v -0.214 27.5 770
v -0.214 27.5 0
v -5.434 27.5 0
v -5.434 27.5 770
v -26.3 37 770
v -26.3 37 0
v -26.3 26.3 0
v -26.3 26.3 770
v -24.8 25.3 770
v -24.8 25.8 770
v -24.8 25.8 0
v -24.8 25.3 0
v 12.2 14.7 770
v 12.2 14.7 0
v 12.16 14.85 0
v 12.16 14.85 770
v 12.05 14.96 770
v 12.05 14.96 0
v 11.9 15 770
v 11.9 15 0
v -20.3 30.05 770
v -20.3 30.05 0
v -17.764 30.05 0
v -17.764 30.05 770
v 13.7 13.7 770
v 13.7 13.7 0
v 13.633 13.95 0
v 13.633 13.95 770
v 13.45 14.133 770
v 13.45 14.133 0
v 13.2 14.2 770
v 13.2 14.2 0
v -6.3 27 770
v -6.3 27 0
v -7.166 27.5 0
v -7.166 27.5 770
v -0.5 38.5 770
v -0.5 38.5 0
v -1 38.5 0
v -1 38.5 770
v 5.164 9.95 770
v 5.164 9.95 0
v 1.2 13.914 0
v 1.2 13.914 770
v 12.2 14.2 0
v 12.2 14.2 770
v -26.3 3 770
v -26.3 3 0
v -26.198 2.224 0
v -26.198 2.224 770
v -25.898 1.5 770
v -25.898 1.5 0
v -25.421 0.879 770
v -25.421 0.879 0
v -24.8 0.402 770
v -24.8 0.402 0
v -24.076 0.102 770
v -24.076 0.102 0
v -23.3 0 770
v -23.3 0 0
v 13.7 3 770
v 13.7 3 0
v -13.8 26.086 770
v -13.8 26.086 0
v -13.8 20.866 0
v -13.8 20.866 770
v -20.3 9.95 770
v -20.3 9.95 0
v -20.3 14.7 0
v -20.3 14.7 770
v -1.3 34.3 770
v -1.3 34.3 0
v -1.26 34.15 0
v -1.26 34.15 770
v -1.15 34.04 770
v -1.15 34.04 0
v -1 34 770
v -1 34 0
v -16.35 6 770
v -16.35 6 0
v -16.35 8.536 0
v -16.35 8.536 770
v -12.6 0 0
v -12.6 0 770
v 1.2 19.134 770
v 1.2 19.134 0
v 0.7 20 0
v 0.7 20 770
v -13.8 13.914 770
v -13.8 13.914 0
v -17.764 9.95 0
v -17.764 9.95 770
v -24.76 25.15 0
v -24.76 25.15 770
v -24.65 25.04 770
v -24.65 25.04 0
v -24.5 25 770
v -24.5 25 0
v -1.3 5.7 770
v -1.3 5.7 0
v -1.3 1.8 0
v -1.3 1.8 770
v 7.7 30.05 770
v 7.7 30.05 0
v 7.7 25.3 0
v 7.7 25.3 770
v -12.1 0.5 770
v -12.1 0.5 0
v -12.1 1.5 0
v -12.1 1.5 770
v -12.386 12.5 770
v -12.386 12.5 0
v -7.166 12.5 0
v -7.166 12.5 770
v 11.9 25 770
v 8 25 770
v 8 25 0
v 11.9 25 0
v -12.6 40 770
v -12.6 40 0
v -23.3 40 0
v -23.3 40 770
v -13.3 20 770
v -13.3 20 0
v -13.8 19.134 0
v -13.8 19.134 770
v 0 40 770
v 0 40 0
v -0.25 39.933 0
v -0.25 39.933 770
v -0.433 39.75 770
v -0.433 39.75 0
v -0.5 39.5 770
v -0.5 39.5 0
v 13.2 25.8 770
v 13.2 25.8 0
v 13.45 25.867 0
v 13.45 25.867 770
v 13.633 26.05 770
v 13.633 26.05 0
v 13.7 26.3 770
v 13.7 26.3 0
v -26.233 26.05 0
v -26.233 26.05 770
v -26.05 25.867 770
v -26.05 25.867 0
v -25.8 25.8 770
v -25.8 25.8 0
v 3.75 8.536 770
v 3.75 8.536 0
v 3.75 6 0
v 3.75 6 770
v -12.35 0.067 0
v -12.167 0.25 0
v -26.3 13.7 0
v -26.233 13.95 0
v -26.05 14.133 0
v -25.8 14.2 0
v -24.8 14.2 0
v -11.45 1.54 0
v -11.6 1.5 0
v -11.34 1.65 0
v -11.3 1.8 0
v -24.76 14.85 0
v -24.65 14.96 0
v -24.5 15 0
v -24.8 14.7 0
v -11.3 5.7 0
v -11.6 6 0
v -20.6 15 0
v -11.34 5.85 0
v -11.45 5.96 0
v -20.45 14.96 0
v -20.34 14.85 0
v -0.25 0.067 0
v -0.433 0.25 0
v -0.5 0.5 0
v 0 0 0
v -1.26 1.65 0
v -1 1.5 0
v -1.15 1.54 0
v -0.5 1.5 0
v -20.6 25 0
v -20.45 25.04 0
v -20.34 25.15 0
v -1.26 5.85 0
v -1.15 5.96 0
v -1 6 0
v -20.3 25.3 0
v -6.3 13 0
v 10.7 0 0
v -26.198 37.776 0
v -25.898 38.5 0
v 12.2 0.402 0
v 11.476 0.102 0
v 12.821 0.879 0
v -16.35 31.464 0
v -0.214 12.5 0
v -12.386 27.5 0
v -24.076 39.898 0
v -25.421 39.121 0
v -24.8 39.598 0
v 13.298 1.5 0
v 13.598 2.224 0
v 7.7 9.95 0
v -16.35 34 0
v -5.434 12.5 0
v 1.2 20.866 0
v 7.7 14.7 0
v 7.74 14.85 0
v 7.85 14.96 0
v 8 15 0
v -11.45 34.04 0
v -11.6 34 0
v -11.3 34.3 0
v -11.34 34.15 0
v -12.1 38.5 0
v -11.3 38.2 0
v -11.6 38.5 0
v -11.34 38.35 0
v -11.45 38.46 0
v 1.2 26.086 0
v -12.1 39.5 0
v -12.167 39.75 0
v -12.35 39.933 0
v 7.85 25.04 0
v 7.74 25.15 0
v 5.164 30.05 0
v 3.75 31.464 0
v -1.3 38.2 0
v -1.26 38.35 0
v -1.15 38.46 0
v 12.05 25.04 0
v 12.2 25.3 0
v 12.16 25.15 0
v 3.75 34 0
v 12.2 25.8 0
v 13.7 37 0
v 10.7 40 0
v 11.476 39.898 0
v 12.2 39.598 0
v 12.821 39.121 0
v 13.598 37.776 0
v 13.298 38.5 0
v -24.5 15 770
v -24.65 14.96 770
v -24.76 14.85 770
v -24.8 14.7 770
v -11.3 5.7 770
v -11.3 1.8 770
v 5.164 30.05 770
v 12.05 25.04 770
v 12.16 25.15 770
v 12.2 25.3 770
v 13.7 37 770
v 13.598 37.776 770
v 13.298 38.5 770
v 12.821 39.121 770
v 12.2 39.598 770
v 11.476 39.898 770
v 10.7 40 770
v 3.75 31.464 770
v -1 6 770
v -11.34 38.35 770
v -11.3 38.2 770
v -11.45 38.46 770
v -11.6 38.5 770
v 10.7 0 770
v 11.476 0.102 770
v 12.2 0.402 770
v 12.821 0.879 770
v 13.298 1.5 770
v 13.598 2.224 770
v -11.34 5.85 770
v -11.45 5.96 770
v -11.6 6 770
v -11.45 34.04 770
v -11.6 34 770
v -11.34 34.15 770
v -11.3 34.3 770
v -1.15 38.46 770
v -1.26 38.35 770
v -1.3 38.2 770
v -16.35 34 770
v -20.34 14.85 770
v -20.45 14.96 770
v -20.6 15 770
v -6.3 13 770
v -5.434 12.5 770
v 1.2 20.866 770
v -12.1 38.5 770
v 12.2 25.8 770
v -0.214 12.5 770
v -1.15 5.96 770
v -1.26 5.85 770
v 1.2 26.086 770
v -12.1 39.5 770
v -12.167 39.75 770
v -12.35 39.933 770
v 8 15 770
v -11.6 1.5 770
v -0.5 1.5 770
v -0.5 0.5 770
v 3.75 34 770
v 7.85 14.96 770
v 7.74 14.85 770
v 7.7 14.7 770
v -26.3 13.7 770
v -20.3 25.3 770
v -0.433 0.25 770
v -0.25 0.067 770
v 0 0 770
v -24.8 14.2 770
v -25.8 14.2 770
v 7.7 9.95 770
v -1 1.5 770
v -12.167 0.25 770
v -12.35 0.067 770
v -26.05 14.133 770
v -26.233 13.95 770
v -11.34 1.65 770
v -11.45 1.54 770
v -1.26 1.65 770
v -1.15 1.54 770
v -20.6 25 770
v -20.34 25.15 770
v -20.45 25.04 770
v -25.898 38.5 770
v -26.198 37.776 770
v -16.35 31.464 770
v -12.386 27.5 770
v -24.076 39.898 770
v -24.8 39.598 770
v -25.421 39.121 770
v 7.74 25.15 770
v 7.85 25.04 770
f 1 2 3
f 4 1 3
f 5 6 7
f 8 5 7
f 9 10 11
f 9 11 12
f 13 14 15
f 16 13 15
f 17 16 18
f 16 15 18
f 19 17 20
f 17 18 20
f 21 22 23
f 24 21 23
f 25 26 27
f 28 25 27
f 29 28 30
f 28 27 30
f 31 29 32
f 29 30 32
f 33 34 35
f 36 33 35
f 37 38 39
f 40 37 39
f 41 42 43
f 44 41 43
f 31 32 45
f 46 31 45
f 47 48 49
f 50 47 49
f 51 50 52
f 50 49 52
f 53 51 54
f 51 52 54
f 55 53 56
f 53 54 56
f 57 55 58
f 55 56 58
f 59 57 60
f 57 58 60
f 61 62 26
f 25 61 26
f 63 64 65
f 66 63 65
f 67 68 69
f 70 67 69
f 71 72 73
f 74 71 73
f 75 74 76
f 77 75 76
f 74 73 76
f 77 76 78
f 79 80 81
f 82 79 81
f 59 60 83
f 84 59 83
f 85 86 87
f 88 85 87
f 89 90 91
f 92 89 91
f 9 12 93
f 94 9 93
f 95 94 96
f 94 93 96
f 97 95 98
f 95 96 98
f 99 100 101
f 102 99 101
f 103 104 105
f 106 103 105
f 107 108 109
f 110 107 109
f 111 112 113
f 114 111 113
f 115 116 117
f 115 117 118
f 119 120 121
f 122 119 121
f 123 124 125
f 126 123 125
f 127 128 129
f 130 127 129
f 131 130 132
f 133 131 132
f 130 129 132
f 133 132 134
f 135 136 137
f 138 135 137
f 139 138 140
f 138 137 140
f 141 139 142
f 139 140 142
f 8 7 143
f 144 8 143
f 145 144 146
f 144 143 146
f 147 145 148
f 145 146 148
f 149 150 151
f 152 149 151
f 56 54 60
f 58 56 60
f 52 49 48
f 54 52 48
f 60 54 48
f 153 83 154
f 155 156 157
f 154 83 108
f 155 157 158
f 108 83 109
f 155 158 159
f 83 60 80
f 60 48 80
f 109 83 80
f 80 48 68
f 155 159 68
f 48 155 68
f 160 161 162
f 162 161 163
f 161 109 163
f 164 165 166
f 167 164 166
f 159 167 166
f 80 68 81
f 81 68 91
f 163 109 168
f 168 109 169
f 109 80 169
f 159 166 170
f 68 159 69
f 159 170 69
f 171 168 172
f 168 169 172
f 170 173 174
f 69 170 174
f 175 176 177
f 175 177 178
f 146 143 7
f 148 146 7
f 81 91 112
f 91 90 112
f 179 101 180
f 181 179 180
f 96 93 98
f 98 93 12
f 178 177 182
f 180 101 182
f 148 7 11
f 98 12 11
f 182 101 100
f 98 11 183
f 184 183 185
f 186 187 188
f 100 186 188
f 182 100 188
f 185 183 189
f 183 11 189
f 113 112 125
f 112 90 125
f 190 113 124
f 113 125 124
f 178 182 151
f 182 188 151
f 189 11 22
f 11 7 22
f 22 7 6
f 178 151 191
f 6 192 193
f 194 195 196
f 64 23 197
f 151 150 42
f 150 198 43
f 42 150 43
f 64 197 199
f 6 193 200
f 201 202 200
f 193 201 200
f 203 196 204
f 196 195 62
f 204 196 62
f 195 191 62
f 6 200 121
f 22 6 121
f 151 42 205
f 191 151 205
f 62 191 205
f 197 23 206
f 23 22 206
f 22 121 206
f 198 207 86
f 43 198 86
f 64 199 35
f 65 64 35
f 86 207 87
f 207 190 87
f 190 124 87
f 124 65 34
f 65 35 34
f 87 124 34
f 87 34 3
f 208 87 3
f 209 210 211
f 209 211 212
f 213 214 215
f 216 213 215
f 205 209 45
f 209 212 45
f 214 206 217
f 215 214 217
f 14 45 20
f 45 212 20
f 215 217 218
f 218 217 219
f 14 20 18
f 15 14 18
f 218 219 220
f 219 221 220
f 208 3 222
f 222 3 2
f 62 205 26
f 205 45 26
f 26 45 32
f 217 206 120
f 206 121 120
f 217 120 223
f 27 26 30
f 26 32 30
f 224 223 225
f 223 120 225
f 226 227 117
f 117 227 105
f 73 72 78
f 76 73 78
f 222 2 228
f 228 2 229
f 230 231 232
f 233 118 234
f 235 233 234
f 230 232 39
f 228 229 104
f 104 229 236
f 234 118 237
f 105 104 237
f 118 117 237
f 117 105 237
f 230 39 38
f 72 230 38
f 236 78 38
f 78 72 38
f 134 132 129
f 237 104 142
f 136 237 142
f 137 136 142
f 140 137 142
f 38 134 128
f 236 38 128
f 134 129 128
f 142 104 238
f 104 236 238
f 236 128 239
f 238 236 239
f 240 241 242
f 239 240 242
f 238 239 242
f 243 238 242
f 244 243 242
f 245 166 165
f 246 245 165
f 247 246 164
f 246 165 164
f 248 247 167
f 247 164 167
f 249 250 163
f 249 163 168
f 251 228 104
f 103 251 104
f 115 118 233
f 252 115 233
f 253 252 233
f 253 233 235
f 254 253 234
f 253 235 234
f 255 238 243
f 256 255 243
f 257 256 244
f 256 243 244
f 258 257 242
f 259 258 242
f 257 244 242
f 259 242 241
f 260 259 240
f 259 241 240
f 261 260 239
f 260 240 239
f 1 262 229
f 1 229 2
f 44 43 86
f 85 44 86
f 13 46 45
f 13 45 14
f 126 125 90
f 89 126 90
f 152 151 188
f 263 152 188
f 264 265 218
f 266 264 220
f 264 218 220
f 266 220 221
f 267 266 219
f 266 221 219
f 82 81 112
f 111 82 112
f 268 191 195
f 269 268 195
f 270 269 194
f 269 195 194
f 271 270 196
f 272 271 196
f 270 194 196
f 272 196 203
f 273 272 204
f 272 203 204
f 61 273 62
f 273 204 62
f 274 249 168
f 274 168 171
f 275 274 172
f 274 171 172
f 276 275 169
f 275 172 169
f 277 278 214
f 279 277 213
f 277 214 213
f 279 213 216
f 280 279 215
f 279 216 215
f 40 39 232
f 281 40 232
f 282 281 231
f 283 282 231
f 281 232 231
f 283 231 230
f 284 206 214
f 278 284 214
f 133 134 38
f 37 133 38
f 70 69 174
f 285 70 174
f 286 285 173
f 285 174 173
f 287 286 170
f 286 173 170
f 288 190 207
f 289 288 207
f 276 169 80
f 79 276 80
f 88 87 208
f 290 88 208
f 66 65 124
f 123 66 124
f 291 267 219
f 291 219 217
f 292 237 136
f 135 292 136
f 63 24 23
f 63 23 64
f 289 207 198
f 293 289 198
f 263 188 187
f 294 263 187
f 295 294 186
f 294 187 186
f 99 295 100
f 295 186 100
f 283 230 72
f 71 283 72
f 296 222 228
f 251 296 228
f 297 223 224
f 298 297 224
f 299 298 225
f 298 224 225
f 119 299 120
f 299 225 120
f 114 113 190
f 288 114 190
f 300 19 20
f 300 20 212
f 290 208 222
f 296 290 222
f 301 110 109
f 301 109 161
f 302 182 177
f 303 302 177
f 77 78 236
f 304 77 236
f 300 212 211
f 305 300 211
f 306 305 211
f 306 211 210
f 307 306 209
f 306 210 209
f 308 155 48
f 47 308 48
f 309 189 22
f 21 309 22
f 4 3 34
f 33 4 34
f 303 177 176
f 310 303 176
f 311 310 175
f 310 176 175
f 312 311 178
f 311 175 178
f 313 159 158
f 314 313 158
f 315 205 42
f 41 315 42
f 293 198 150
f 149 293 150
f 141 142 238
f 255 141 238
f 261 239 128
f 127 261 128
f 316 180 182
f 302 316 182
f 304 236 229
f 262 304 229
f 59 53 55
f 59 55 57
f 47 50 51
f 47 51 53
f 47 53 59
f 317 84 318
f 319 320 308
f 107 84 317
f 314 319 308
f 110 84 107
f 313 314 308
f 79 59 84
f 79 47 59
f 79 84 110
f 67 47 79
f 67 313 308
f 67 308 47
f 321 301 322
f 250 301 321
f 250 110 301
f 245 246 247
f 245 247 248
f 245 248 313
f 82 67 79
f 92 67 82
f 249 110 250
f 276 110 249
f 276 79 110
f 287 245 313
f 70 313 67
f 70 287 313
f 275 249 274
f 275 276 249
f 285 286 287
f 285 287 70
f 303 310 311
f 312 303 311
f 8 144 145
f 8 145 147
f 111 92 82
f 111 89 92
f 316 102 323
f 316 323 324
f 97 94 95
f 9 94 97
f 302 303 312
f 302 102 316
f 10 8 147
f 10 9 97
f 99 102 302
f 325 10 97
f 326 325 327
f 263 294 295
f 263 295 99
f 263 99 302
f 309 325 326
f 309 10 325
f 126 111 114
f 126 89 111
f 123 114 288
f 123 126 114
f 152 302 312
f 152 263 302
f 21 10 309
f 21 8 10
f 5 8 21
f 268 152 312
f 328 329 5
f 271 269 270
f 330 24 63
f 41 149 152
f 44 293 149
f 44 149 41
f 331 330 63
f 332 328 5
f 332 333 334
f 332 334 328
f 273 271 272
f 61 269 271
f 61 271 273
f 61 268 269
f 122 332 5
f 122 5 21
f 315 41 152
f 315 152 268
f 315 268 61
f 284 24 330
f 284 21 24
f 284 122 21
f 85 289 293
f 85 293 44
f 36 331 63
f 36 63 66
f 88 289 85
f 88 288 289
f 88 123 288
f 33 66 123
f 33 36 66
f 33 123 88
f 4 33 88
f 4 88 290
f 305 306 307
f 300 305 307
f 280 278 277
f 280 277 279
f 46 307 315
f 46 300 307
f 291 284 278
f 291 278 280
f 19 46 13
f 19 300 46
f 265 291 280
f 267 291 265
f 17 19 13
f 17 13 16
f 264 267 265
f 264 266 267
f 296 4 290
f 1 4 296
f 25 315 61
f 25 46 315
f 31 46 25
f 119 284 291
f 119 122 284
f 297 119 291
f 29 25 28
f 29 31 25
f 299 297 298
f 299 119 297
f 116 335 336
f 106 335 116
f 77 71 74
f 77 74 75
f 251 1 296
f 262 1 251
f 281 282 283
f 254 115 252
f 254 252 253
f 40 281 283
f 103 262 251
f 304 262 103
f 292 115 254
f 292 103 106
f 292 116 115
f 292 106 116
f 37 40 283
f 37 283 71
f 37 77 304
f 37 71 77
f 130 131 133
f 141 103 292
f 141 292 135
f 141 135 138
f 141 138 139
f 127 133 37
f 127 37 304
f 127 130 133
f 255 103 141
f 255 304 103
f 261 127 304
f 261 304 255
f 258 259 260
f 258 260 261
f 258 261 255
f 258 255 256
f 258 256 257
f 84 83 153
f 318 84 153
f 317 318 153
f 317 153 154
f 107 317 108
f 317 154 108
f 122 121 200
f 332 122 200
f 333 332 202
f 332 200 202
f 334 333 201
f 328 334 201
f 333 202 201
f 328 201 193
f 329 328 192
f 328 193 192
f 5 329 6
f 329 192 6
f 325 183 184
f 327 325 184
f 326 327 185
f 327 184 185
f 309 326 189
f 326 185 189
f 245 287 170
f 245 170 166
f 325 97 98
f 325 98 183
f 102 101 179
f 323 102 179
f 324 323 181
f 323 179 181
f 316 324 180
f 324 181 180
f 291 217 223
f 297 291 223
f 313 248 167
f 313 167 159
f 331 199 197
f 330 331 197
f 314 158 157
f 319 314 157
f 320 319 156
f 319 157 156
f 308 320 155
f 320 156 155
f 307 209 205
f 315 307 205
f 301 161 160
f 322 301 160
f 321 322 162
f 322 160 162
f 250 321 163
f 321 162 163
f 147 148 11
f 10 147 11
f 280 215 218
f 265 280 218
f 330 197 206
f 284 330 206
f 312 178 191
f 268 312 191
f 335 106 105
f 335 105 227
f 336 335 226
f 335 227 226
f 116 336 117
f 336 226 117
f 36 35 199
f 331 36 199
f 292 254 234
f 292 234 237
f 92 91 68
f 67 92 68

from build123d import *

# Parameters (mm, degrees)
BOSS_EXTRUDE1_DEPTH = 770


with BuildPart() as part:
    # Sketch2 → Boss-Extrude1 (new body)
    with BuildSketch(Plane.XY):
        with BuildLine():
            Line((-20.29996667, 9.949913991), (-20.29996667, 14.70003333))
            ThreePointArc((-20.29996667, 14.70003333), (-20.387834636, 14.912165364), (-20.59996667, 15.00003333))
            Line((-20.59996667, 15.00003333), (-24.49996667, 15.00003333))
            ThreePointArc((-24.49996667, 15.00003333), (-24.712098704, 14.912165364), (-24.79996667, 14.70003333))
            Line((-24.79996667, 14.70003333), (-24.79996667, 14.20003333))
            Line((-24.79996667, 14.20003333), (-25.79996667, 14.20003333))
            ThreePointArc((-25.79996667, 14.20003333), (-26.153520061, 14.053586721), (-26.29996667, 13.70003333))
            Line((-26.29996667, 13.70003333), (-26.29996667, 3))
            ThreePointArc((-26.29996667, 3), (-25.421287014, 0.878679656), (-23.29996667, 0))
            Line((-23.29996667, 0), (-12.6, 0))
            ThreePointArc((-12.6, 0), (-12.246446609, 0.146446609), (-12.1, 0.5))
            Line((-12.1, 0.5), (-12.1, 1.5))
            Line((-12.1, 1.5), (-11.6, 1.5))
            ThreePointArc((-11.6, 1.5), (-11.387867966, 1.587867966), (-11.3, 1.8))
            Line((-11.3, 1.8), (-11.3, 5.7))
            ThreePointArc((-11.3, 5.7), (-11.387867966, 5.912132034), (-11.6, 6))
            Line((-11.6, 6), (-16.350119339, 6))
            Line((-16.350119339, 6), (-16.350119339, 8.535633769))
            Line((-16.350119339, 8.535633769), (-12.385643087, 12.500110021))
            Line((-12.385643087, 12.500110021), (-7.165992074, 12.500110021))
            Line((-7.165992074, 12.500110021), (-6.29996667, 13.000110021))
            Line((-6.29996667, 13.000110021), (-5.433941266, 12.500110021))
            Line((-5.433941266, 12.500110021), (-0.214290253, 12.500110021))
            Line((-0.214290253, 12.500110021), (3.750119339, 8.535700429))
            Line((3.750119339, 8.535700429), (3.750119339, 6))
            Line((3.750119339, 6), (-1, 6))
            ThreePointArc((-1, 6), (-1.212132034, 5.912132034), (-1.3, 5.7))
            Line((-1.3, 5.7), (-1.3, 1.8))
            ThreePointArc((-1.3, 1.8), (-1.212132034, 1.587867966), (-1, 1.5))
            Line((-1, 1.5), (-0.5, 1.5))
            Line((-0.5, 1.5), (-0.5, 0.5))
            ThreePointArc((-0.5, 0.5), (-0.353553391, 0.146446609), (0, 0))
            Line((0, 0), (10.70003333, 0))
            ThreePointArc((10.70003333, 0), (12.821353674, 0.878679656), (13.70003333, 3))
            Line((13.70003333, 3), (13.70003333, 13.69996667))
            ThreePointArc((13.70003333, 13.69996667), (13.553586721, 14.053520061), (13.20003333, 14.19996667))
            Line((13.20003333, 14.19996667), (12.20003333, 14.19996667))
            Line((12.20003333, 14.19996667), (12.20003333, 14.69996667))
            ThreePointArc((12.20003333, 14.69996667), (12.112165364, 14.912098704), (11.90003333, 14.99996667))
            Line((11.90003333, 14.99996667), (8.00003333, 14.99996667))
            ThreePointArc((8.00003333, 14.99996667), (7.787901296, 14.912098704), (7.70003333, 14.69996667))
            Line((7.70003333, 14.69996667), (7.70003333, 9.949847331))
            Line((7.70003333, 9.949847331), (5.164399561, 9.949847331))
            Line((5.164399561, 9.949847331), (1.199923309, 13.914323583))
            Line((1.199923309, 13.914323583), (1.199923309, 19.133974596))
            Line((1.199923309, 19.133974596), (0.699923309, 20))
            Line((0.699923309, 20), (1.199923309, 20.866025404))
            Line((1.199923309, 20.866025404), (1.199923309, 26.085676417))
            Line((1.199923309, 26.085676417), (5.164332901, 30.050086009))
            Line((5.164332901, 30.050086009), (7.70003333, 30.050086009))
            Line((7.70003333, 30.050086009), (7.70003333, 25.29996667))
            ThreePointArc((7.70003333, 25.29996667), (7.787901296, 25.087834636), (8.00003333, 24.99996667))
            Line((8.00003333, 24.99996667), (11.90003333, 24.99996667))
            ThreePointArc((11.90003333, 24.99996667), (12.112165364, 25.087834636), (12.20003333, 25.29996667))
            Line((12.20003333, 25.29996667), (12.20003333, 25.79996667))
            Line((12.20003333, 25.79996667), (13.20003333, 25.79996667))
            ThreePointArc((13.20003333, 25.79996667), (13.553586721, 25.946413279), (13.70003333, 26.29996667))
            Line((13.70003333, 26.29996667), (13.70003333, 37))
            ThreePointArc((13.70003333, 37), (12.821353674, 39.121320344), (10.70003333, 40))
            Line((10.70003333, 40), (6.666e-05, 40))
            ThreePointArc((6.666e-05, 40), (-0.353486731, 39.853553391), (-0.49993334, 39.5))
            Line((-0.49993334, 39.5), (-0.49993334, 38.5))
            Line((-0.49993334, 38.5), (-0.99993334, 38.5))
            ThreePointArc((-0.99993334, 38.5), (-1.212065374, 38.412132034), (-1.29993334, 38.2))
            Line((-1.29993334, 38.2), (-1.29993334, 34.3))
            ThreePointArc((-1.29993334, 34.3), (-1.212065374, 34.087867966), (-0.99993334, 34))
            Line((-0.99993334, 34), (3.750185999, 34))
            Line((3.750185999, 34), (3.750185999, 31.464366231))
            Line((3.750185999, 31.464366231), (-0.214290253, 27.499889979))
            Line((-0.214290253, 27.499889979), (-5.433941266, 27.499889979))
            Line((-5.433941266, 27.499889979), (-6.29996667, 26.999889979))
            Line((-6.29996667, 26.999889979), (-7.165992074, 27.499889979))
            Line((-7.165992074, 27.499889979), (-12.385643087, 27.499889979))
            Line((-12.385643087, 27.499889979), (-16.350052679, 31.464299571))
            Line((-16.350052679, 31.464299571), (-16.350052679, 34))
            Line((-16.350052679, 34), (-11.59993334, 34))
            ThreePointArc((-11.59993334, 34), (-11.387801306, 34.087867966), (-11.29993334, 34.3))
            Line((-11.29993334, 34.3), (-11.29993334, 38.2))
            ThreePointArc((-11.29993334, 38.2), (-11.387801306, 38.412132034), (-11.59993334, 38.5))
            Line((-11.59993334, 38.5), (-12.09993334, 38.5))
            Line((-12.09993334, 38.5), (-12.09993334, 39.5))
            ThreePointArc((-12.09993334, 39.5), (-12.246379949, 39.853553391), (-12.59993334, 40))
            Line((-12.59993334, 40), (-23.29996667, 40))
            ThreePointArc((-23.29996667, 40), (-25.421287014, 39.121320344), (-26.29996667, 37))
            Line((-26.29996667, 37), (-26.29996667, 26.30003333))
            ThreePointArc((-26.29996667, 26.30003333), (-26.153520061, 25.946479939), (-25.79996667, 25.80003333))
            Line((-25.79996667, 25.80003333), (-24.79996667, 25.80003333))
            Line((-24.79996667, 25.80003333), (-24.79996667, 25.30003333))
            ThreePointArc((-24.79996667, 25.30003333), (-24.712098704, 25.087901296), (-24.49996667, 25.00003333))
            Line((-24.49996667, 25.00003333), (-20.59996667, 25.00003333))
            ThreePointArc((-20.59996667, 25.00003333), (-20.387834636, 25.087901296), (-20.29996667, 25.30003333))
            Line((-20.29996667, 25.30003333), (-20.29996667, 30.050152669))
            Line((-20.29996667, 30.050152669), (-17.764332901, 30.050152669))
            Line((-17.764332901, 30.050152669), (-13.799856649, 26.085676417))
            Line((-13.799856649, 26.085676417), (-13.799856649, 20.866025404))
            Line((-13.799856649, 20.866025404), (-13.299856649, 20))
            Line((-13.299856649, 20), (-13.799856649, 19.133974596))
            Line((-13.799856649, 19.133974596), (-13.799856649, 13.914323583))
            Line((-13.799856649, 13.914323583), (-17.764266241, 9.949913991))
            Line((-17.764266241, 9.949913991), (-20.29996667, 9.949913991))
        make_face()
    extrude(amount=BOSS_EXTRUDE1_DEPTH)


solid = part.part
